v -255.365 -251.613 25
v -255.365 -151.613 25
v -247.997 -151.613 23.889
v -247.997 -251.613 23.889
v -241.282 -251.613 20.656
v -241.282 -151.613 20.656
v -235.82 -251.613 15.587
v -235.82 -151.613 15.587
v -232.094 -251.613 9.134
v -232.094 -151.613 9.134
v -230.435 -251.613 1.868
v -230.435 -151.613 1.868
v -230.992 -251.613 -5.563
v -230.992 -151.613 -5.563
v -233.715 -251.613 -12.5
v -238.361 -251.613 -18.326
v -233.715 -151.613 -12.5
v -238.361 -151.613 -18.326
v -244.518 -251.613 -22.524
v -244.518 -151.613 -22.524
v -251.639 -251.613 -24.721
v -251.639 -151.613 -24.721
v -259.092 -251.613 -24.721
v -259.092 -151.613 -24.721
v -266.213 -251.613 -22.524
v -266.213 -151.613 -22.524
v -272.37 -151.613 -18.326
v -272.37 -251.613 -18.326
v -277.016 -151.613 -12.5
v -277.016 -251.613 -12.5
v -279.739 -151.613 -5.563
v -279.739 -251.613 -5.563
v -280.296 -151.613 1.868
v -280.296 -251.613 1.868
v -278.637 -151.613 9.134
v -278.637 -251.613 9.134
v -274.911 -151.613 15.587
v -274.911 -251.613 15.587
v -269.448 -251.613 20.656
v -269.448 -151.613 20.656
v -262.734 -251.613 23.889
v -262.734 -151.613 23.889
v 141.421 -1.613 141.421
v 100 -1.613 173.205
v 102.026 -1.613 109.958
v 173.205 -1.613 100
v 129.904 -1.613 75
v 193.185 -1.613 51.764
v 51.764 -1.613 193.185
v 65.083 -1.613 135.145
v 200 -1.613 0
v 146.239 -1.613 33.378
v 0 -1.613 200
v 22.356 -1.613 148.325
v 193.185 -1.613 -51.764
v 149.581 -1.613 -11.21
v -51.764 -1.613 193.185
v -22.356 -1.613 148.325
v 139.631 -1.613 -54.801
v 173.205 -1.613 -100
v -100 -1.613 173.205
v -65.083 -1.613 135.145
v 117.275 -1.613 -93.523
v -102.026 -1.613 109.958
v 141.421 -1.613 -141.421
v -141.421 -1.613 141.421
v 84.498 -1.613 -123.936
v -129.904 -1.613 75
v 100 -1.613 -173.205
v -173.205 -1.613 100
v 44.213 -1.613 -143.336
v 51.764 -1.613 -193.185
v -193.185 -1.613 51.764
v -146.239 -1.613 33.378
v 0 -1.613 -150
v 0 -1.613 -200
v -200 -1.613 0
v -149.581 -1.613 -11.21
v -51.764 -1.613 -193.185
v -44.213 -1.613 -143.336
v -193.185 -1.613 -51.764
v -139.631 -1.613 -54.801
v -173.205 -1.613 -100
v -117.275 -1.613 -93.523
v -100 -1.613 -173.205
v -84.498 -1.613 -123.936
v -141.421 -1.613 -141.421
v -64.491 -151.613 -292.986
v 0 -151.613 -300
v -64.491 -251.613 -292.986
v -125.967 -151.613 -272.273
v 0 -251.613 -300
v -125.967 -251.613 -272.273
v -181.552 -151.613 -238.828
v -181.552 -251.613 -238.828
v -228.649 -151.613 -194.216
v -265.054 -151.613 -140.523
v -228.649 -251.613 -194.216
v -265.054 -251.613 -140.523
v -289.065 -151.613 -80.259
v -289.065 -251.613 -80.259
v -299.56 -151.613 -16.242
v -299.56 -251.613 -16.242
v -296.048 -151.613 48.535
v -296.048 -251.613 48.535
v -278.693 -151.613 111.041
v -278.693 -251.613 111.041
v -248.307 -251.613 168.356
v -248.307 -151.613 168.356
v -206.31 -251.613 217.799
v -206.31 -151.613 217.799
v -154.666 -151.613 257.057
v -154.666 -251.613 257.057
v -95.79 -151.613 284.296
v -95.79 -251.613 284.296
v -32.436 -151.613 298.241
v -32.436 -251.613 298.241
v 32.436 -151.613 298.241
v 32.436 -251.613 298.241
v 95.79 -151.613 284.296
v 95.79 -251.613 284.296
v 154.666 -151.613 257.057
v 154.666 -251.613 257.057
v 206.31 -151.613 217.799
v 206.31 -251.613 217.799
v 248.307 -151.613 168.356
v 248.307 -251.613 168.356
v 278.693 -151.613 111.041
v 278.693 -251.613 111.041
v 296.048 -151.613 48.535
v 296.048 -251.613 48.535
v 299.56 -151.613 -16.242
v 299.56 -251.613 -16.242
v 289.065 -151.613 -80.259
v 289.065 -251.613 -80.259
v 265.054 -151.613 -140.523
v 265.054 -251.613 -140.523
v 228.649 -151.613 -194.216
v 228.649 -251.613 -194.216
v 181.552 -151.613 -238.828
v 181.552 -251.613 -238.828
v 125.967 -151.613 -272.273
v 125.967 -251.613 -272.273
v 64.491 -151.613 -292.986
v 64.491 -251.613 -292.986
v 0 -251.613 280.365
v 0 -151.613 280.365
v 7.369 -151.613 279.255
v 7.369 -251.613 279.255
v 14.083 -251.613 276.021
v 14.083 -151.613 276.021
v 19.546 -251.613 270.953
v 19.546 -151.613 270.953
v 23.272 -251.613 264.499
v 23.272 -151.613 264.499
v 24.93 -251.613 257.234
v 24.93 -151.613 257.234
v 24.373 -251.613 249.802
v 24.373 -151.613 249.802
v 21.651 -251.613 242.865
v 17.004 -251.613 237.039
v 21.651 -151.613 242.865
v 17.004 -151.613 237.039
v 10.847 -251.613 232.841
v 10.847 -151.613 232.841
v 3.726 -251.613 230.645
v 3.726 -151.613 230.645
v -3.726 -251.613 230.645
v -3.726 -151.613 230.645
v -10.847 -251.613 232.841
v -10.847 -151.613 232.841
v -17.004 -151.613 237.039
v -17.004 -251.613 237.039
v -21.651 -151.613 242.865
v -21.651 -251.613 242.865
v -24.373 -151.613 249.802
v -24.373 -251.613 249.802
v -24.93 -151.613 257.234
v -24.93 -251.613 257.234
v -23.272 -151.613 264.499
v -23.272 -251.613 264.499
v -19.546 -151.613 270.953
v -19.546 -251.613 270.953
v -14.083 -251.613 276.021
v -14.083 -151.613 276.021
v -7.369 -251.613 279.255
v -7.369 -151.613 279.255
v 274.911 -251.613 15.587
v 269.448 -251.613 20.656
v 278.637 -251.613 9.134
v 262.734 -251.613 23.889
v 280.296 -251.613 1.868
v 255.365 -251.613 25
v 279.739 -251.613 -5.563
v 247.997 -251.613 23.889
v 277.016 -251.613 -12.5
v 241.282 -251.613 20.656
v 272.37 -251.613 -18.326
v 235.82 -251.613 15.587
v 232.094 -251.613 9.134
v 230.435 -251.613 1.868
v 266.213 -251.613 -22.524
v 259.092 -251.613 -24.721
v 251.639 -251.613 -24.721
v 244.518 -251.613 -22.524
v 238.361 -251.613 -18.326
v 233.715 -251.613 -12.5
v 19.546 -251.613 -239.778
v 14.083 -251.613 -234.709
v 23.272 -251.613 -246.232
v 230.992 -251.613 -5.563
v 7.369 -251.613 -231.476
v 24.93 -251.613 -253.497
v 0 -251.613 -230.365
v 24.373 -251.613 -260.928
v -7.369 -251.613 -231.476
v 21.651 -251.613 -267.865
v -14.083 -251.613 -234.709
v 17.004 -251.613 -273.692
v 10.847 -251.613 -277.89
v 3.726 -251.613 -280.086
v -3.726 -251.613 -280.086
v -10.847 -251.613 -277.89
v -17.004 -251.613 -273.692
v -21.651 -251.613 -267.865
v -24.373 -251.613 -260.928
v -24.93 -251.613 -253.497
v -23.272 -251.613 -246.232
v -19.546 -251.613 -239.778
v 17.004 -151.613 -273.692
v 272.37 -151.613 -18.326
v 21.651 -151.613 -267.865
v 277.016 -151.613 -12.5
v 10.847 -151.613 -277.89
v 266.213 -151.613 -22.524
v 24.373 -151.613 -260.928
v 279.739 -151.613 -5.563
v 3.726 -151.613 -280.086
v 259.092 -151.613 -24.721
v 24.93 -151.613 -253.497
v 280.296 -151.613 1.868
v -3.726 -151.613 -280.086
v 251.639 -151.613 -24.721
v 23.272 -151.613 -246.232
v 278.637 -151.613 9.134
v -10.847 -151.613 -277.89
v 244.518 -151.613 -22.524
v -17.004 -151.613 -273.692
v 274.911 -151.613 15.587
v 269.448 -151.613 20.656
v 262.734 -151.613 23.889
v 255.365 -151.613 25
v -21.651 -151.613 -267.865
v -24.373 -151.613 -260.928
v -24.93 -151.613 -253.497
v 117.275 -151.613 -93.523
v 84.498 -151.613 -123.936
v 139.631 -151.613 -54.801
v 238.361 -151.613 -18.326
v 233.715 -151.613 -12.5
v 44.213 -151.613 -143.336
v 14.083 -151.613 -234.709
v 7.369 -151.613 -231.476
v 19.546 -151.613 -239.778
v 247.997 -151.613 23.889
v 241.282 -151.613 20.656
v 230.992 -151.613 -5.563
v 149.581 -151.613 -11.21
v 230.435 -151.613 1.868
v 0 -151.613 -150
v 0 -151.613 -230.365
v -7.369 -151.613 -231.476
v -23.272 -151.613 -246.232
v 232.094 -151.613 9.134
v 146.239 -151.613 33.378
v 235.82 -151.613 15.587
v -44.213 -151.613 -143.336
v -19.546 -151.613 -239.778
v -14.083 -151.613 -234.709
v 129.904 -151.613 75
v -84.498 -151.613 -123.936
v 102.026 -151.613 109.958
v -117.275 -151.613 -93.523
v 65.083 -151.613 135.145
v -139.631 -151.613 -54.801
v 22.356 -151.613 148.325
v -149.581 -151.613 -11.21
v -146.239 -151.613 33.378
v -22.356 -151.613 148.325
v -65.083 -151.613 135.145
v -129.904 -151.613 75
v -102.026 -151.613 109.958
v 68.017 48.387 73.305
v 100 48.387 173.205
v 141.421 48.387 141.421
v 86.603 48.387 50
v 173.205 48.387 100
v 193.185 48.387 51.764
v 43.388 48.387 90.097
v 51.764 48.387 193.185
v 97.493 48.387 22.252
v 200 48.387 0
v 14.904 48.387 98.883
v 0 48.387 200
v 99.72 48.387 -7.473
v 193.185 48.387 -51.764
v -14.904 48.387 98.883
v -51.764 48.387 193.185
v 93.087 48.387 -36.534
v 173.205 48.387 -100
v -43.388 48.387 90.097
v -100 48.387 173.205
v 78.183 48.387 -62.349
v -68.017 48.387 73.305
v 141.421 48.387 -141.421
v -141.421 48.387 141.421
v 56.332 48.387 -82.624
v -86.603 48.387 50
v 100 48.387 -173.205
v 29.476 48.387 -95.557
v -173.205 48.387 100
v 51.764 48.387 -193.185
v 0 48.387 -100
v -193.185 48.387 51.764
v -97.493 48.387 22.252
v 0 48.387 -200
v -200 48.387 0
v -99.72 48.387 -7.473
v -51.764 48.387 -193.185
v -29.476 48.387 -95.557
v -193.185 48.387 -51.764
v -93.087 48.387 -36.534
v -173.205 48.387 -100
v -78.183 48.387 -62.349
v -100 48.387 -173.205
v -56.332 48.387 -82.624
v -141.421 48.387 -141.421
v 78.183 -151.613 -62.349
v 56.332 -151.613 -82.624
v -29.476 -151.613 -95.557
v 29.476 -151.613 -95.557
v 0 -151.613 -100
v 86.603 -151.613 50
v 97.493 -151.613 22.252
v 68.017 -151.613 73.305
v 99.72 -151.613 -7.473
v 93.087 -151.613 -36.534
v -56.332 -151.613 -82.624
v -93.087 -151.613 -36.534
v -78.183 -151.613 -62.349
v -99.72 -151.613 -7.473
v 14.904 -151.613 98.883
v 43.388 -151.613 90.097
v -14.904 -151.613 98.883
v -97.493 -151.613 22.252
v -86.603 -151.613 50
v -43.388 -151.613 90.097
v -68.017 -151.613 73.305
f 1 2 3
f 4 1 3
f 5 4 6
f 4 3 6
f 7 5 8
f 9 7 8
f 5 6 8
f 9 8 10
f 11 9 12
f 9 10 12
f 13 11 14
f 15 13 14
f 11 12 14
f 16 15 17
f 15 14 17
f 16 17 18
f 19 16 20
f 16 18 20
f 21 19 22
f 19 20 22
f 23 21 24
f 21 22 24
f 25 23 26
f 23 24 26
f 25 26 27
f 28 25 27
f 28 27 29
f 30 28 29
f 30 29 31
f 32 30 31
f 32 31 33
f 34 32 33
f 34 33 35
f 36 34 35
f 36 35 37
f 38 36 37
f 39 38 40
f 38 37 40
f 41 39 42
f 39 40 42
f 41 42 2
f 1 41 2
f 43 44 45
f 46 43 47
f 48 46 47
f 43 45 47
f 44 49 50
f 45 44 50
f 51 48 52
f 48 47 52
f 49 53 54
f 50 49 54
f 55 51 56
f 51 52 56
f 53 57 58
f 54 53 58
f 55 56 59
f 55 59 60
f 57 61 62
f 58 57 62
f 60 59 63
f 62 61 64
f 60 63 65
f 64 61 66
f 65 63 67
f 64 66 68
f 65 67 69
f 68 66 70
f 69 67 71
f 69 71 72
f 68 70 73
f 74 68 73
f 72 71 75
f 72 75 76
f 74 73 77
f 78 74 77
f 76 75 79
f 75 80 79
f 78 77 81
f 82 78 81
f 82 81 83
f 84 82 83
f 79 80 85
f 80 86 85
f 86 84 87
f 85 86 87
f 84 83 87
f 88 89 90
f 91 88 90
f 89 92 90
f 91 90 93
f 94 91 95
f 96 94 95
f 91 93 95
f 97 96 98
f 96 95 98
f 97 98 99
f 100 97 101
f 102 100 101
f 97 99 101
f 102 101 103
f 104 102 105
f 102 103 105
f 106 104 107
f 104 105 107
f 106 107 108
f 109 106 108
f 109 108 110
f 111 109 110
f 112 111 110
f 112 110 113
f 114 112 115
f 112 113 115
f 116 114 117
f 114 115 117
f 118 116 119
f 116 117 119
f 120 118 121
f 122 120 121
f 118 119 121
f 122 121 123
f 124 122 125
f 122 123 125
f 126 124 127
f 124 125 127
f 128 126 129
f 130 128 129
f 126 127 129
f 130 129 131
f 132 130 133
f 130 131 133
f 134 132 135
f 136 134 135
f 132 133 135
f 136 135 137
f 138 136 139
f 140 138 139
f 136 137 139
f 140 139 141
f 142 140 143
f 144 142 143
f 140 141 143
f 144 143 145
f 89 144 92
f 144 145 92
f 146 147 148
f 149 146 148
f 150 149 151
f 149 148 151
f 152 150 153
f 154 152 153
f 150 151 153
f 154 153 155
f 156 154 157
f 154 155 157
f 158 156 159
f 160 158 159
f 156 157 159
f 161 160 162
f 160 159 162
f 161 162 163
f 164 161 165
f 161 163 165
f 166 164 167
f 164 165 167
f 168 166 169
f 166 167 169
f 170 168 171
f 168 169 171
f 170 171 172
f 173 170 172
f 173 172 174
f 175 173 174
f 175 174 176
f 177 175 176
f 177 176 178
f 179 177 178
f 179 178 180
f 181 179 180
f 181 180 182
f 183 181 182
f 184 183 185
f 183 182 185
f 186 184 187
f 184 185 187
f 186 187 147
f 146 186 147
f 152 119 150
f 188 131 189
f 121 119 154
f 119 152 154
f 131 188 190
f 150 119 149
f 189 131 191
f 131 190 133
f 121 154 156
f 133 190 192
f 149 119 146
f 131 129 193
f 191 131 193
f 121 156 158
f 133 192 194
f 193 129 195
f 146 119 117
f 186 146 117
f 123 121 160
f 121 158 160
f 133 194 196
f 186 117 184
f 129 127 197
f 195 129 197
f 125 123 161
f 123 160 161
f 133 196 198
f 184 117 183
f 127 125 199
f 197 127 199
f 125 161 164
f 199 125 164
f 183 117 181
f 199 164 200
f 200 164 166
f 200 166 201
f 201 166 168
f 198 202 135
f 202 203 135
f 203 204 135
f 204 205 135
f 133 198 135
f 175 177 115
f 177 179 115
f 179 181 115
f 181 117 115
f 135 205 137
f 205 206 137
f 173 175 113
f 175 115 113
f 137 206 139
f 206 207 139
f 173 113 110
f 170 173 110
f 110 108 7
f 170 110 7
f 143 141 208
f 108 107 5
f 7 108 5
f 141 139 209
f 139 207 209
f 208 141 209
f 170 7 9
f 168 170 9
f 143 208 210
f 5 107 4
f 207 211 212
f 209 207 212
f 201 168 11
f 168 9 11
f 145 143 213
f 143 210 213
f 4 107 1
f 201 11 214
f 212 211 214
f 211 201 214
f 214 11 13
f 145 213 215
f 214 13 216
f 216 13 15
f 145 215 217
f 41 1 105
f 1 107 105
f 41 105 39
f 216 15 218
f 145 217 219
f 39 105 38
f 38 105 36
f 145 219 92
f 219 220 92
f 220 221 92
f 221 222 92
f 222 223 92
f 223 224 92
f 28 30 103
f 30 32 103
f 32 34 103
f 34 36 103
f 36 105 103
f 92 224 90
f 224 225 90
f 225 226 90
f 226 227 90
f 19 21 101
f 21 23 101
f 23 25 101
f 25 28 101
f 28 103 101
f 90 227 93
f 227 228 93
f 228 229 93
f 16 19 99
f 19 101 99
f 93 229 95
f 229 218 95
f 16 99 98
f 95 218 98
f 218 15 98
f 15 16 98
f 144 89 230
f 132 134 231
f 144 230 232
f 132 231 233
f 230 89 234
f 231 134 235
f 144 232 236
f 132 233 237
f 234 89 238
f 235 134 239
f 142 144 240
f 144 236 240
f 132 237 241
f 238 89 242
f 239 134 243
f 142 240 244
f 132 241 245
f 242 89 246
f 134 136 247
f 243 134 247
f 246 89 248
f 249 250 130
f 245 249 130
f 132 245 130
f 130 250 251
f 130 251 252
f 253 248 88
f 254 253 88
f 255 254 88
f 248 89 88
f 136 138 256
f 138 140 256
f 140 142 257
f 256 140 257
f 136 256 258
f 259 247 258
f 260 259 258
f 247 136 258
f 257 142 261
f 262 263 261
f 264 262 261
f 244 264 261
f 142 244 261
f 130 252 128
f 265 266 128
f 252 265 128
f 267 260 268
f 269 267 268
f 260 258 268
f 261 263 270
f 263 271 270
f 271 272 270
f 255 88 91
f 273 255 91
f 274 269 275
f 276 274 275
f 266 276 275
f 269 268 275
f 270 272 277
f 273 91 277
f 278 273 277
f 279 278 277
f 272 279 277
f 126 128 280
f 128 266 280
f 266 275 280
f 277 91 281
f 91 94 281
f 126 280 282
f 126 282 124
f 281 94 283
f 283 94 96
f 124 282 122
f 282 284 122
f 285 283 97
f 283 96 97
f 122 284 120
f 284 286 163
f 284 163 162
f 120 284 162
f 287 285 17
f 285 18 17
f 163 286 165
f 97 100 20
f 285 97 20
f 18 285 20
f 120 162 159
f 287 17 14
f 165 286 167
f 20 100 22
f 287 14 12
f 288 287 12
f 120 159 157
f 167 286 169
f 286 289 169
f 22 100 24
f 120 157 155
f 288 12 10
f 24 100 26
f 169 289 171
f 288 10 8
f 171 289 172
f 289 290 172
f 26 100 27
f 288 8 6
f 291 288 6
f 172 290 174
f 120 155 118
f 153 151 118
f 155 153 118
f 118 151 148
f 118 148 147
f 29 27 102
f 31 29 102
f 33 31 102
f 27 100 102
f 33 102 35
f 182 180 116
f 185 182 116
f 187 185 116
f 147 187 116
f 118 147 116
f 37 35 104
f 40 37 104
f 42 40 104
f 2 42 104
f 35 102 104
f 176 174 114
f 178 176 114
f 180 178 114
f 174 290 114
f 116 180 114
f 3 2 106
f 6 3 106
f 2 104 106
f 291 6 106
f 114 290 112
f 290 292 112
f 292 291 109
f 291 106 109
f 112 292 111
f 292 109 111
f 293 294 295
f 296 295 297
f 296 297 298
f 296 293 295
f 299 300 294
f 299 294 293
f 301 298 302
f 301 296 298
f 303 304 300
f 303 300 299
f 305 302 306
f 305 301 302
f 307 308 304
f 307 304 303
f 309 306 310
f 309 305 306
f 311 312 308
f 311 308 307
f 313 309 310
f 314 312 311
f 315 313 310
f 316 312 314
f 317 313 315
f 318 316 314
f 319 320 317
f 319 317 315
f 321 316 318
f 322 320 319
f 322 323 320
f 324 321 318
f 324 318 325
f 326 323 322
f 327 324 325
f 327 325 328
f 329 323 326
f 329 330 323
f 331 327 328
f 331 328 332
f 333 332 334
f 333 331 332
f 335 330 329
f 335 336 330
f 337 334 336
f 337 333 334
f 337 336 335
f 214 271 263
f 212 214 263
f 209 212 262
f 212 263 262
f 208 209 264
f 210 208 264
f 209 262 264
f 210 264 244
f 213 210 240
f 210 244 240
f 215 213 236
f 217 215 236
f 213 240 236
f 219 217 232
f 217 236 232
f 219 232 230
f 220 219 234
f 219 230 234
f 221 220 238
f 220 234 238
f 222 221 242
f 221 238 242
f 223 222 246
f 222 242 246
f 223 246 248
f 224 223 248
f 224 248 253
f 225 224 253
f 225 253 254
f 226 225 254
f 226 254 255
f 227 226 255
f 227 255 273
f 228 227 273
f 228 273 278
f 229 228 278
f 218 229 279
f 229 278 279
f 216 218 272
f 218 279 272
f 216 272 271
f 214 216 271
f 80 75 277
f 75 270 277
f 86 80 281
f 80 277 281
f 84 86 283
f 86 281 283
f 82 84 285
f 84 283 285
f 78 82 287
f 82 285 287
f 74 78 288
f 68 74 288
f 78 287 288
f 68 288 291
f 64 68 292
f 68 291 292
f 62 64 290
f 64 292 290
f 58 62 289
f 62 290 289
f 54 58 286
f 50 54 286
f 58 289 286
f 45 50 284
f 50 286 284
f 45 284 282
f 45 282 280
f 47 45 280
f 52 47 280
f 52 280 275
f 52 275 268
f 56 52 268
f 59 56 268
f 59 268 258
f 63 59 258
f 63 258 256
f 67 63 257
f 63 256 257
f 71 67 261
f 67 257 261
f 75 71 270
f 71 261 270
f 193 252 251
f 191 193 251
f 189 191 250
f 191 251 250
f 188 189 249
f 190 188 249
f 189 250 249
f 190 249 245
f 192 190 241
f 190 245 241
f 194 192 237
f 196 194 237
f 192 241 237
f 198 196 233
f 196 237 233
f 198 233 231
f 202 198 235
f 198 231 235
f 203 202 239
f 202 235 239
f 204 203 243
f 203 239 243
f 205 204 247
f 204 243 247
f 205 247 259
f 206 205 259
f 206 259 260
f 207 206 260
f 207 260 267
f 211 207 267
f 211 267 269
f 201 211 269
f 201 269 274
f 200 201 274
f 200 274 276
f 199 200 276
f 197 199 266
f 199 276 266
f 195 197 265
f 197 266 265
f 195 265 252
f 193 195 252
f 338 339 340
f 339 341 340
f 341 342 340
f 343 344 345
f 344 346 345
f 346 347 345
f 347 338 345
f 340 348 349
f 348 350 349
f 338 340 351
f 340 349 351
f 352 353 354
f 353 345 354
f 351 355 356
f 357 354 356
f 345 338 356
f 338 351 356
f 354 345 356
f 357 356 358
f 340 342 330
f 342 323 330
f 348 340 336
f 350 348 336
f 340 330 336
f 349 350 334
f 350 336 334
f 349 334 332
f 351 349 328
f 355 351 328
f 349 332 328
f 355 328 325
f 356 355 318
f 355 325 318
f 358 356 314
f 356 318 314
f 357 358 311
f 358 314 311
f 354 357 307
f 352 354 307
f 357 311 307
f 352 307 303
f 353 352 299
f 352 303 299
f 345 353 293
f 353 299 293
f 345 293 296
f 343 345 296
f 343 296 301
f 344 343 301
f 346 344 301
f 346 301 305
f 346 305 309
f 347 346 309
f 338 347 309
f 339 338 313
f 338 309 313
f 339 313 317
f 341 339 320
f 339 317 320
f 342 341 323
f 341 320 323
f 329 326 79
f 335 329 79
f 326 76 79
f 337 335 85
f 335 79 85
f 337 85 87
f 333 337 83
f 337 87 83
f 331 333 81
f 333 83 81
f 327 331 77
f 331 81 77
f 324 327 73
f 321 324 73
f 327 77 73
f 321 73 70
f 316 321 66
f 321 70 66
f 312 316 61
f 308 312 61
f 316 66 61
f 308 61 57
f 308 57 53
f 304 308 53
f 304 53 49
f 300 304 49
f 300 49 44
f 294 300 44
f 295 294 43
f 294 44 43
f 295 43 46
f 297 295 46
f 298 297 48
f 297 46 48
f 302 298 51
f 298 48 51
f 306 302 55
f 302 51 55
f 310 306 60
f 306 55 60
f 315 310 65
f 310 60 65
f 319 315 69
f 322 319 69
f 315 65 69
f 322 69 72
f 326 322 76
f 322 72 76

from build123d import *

# Parameters (mm, degrees)
SKETCH5_R          = 25
CUT_EXTRUDE2_DEPTH = 100


with BuildPart() as part:
    # Sketch4 → Revolve2 (revolve)
    with BuildSketch(Plane.XY):
        Polygon((0, -251.612903226), (0, -151.612903226), (100, -151.612903226), (100, 48.387096774), (152.822580645, 48.387096774), (200, 48.387096774), (200, -1.612903226), (150, -1.612903226), (150, -151.612903226), (300, -151.612903226), (300, -251.612903226), align=None)
    revolve(axis=Axis((0, -251.612903226, 0), (0, 1, 0)))

    # Sketch5 → Cut-Extrude2 (cut)
    with BuildSketch(Plane(origin=(0, -151.612903226, 0), x_dir=(1, 0, 0), z_dir=(0, 1, 0))):
        with Locations((0, 255.365455535)):
            Circle(SKETCH5_R)
        with Locations((255.365455535, 0)):
            Circle(SKETCH5_R)
        with Locations((0, -255.365455535)):
            Circle(SKETCH5_R)
        with Locations((-255.365455535, 0)):
            Circle(SKETCH5_R)
    extrude(amount=-CUT_EXTRUDE2_DEPTH, mode=Mode.SUBTRACT)


solid = part.part
